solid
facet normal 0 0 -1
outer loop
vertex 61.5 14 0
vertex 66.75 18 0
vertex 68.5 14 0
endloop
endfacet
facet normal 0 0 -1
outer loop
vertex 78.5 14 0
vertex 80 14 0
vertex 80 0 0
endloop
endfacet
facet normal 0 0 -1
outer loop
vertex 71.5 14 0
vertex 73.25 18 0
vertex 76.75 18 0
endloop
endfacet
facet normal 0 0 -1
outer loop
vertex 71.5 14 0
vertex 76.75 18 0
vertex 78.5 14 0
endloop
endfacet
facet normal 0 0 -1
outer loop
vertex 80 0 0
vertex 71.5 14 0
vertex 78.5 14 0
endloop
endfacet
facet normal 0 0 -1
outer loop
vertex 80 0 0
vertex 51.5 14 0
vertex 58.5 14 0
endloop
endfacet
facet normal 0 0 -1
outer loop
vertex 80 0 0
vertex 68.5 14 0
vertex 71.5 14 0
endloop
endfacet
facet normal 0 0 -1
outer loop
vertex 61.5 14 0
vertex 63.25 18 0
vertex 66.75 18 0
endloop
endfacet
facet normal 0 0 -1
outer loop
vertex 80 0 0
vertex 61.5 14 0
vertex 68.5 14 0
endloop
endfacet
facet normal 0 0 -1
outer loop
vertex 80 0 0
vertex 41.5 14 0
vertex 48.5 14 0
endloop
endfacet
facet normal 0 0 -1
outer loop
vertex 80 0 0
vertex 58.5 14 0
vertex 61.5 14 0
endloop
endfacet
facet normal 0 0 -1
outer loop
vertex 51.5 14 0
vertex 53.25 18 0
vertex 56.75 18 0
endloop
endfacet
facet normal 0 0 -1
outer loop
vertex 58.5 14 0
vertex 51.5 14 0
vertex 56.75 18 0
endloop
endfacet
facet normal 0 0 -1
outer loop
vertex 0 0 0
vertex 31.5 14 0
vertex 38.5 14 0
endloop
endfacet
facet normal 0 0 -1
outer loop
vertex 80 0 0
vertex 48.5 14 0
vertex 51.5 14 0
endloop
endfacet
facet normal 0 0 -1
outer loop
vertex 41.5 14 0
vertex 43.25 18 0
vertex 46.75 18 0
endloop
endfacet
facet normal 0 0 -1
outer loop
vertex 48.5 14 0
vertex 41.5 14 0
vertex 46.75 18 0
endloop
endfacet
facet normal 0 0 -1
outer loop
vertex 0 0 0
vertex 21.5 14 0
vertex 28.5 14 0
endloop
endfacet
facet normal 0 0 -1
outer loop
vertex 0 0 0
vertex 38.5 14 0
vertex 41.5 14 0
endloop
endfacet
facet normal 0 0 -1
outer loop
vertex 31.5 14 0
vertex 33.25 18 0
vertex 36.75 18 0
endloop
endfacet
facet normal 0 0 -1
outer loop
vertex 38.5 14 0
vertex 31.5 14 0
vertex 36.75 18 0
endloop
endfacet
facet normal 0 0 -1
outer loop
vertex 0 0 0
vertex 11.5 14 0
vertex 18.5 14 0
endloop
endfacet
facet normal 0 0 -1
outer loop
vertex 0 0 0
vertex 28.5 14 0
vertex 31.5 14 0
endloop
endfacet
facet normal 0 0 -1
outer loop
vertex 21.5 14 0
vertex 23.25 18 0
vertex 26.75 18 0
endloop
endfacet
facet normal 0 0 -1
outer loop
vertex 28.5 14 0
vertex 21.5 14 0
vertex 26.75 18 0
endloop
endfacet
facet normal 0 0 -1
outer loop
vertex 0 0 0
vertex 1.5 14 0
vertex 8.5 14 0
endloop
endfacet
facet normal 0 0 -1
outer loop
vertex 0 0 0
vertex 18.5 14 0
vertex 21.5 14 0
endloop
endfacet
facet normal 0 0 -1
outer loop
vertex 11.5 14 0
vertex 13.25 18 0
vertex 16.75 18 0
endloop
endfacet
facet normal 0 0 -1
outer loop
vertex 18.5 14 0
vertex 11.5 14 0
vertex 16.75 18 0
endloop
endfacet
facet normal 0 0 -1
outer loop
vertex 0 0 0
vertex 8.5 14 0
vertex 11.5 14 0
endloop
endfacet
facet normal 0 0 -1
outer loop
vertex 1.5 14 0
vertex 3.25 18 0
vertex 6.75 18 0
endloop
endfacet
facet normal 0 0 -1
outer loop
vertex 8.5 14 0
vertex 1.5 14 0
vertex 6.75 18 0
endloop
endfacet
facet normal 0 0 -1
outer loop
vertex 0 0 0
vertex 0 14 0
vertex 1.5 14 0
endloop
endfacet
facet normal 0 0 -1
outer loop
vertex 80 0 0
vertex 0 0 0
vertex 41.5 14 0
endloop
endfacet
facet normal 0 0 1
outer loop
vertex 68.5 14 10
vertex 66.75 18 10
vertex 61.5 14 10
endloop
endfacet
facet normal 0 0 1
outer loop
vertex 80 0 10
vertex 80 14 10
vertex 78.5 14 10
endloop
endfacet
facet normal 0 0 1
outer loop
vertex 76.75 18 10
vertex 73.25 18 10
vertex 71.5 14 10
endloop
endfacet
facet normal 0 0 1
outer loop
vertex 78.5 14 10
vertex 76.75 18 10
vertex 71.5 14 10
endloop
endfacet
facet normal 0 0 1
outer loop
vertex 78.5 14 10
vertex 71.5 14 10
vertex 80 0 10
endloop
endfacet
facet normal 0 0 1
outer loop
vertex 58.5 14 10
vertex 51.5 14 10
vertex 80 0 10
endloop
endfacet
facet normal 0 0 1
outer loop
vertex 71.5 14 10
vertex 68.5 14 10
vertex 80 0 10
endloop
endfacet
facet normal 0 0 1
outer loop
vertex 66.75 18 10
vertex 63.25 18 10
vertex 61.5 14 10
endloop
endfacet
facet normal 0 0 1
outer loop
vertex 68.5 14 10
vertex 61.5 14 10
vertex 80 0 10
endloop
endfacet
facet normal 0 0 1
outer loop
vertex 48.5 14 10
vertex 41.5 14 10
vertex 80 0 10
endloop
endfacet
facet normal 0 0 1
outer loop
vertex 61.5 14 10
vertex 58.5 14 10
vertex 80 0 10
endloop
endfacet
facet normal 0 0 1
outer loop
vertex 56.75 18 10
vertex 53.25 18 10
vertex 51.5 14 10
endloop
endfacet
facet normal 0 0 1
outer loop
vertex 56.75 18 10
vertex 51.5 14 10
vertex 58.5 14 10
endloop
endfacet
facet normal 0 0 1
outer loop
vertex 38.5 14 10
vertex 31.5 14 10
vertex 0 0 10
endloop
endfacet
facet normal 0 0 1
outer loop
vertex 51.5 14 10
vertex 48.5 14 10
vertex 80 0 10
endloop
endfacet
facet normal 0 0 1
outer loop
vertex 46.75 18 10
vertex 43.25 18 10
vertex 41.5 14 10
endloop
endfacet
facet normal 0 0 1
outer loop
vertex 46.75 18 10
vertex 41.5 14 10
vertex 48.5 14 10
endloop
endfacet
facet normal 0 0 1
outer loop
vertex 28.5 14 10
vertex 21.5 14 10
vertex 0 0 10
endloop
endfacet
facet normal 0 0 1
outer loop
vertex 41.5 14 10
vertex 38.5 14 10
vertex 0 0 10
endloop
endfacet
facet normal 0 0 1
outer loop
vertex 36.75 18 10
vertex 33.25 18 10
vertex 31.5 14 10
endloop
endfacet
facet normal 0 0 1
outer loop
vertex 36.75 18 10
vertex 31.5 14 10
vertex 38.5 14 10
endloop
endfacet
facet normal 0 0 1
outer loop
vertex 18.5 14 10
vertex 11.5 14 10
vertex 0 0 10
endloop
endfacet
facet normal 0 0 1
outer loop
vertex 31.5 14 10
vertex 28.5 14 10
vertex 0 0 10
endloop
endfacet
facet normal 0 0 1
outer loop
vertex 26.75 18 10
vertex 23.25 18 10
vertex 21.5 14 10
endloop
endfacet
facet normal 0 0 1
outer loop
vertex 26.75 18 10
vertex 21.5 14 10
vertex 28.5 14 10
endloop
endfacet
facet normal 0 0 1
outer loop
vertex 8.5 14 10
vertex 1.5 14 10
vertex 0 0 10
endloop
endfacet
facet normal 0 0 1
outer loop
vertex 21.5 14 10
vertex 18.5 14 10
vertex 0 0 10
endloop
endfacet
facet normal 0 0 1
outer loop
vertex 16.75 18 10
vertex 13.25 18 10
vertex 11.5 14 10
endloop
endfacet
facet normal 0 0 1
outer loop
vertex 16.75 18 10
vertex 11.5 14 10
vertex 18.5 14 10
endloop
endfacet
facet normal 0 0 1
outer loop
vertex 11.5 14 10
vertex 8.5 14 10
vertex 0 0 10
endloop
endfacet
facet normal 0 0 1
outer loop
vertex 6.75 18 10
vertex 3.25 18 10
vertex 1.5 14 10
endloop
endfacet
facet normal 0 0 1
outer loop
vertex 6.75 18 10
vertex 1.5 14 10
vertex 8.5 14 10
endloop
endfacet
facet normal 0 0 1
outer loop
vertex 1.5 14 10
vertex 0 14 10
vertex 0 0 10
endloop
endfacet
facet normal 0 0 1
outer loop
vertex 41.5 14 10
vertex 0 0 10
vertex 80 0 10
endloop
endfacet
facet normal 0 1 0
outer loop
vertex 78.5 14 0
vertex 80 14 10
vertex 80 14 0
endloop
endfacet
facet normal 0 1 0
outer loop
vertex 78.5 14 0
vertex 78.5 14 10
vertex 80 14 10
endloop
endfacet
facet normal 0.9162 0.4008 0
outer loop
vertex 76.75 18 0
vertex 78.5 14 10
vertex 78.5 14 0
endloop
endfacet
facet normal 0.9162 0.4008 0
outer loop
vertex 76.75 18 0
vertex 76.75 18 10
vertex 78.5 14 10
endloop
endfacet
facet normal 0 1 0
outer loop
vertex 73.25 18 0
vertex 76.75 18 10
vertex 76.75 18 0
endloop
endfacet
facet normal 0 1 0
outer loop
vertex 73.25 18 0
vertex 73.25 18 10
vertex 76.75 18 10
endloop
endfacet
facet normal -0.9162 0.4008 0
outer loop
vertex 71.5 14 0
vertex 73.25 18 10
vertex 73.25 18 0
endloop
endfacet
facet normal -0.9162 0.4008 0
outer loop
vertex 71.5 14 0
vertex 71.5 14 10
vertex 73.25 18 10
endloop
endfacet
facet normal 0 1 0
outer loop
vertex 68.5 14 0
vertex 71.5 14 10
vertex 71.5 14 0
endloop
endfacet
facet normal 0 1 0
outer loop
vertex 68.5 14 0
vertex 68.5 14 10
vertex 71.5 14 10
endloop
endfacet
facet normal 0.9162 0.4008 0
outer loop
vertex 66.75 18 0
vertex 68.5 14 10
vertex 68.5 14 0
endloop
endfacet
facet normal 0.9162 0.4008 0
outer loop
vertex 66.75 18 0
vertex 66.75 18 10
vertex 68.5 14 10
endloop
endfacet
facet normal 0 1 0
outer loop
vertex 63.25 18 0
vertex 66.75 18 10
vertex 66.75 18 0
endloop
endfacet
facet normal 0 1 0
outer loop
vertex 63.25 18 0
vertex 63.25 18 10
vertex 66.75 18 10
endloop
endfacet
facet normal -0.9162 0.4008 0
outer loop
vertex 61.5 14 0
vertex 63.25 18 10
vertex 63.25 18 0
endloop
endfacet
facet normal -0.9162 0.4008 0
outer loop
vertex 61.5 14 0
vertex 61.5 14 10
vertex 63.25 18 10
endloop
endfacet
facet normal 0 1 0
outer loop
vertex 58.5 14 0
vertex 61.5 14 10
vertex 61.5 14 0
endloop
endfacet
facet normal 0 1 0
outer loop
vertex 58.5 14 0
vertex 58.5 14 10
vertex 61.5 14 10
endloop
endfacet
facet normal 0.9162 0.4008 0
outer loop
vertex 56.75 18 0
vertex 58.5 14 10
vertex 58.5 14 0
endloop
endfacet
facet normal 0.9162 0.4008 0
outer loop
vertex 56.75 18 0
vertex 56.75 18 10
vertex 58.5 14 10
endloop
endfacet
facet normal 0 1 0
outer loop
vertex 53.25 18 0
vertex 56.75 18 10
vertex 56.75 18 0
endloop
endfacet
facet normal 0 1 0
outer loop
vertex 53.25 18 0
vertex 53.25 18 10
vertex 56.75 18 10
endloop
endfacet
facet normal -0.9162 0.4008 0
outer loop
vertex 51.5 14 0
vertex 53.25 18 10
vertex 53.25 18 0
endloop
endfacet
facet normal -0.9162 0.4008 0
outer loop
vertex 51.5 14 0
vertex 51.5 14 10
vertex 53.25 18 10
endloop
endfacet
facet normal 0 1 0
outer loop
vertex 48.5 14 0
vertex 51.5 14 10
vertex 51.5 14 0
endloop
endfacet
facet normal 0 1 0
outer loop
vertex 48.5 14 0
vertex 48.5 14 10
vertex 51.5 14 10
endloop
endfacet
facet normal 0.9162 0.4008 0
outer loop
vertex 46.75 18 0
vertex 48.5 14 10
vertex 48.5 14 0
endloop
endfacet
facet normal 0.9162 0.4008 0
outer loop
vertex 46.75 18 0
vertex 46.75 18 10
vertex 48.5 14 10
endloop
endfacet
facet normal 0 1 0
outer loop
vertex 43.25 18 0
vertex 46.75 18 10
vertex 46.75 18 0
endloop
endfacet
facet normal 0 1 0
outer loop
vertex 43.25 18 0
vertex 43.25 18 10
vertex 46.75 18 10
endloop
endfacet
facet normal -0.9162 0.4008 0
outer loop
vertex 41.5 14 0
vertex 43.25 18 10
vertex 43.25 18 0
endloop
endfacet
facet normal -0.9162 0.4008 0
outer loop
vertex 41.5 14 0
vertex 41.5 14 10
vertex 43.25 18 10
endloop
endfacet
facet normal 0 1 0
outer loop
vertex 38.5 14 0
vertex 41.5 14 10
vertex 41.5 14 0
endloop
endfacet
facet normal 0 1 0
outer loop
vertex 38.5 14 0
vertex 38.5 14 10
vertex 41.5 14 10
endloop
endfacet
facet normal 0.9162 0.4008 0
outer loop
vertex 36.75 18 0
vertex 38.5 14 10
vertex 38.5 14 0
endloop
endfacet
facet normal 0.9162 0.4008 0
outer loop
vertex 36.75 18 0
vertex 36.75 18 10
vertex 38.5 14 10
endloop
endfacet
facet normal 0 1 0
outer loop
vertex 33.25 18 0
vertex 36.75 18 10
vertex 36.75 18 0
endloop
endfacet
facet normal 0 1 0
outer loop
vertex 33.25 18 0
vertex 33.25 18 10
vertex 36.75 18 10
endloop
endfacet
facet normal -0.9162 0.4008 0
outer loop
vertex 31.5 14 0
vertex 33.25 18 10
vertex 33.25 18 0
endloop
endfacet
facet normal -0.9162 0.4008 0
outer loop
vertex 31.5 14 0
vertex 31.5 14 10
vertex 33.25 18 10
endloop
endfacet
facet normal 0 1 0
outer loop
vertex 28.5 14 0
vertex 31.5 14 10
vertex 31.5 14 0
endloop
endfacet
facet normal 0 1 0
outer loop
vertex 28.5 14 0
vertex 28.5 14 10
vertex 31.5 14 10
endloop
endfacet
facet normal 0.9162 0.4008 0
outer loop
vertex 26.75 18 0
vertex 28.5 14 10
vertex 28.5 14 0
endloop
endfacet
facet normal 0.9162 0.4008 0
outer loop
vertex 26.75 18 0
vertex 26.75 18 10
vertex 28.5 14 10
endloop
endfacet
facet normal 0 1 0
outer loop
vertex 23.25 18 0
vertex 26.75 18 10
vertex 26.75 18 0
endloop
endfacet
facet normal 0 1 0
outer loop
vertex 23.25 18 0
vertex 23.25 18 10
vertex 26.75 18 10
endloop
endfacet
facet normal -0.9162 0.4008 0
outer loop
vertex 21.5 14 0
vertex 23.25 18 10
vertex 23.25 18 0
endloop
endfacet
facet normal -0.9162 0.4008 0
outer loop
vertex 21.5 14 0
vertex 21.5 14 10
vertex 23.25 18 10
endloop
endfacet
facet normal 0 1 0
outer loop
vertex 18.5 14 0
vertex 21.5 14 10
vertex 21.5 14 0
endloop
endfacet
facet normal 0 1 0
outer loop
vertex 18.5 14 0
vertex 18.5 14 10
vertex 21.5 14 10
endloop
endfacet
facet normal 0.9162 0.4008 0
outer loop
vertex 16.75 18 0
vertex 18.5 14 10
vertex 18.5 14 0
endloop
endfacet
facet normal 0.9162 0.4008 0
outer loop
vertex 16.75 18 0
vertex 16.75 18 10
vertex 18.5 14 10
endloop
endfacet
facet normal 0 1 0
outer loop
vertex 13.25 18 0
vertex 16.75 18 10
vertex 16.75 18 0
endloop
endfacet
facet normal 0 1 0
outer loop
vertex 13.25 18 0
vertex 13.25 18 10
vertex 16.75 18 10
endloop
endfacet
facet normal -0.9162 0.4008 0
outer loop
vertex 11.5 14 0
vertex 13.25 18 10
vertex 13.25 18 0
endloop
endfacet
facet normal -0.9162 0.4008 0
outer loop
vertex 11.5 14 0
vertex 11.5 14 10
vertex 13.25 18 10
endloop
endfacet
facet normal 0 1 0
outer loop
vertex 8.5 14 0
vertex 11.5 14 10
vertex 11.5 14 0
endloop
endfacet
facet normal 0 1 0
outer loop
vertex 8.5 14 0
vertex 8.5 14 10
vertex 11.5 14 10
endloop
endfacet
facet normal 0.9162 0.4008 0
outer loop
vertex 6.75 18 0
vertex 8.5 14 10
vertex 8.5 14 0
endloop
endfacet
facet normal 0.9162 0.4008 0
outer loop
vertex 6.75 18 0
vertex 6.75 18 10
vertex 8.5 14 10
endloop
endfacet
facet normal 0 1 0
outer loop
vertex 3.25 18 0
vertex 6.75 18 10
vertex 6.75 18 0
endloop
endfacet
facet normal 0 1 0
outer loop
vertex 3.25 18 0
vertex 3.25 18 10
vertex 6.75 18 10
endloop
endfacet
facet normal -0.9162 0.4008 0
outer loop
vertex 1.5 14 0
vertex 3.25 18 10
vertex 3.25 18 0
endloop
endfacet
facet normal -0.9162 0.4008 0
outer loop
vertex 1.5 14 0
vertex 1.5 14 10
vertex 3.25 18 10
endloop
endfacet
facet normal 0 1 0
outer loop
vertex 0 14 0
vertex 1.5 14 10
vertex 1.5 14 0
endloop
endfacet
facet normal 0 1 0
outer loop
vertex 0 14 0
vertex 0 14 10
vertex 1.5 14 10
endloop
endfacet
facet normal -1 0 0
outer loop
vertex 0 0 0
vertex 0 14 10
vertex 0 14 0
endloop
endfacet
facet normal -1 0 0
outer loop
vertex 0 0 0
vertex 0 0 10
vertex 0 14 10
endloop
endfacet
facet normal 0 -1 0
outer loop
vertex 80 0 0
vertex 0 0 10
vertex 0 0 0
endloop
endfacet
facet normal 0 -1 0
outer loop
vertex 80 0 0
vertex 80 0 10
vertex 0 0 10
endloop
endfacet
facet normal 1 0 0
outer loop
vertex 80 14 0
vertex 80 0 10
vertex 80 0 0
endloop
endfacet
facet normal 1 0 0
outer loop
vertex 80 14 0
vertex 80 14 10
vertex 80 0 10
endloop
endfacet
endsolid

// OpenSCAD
$fn = 32;

// ----------------------------------------------------------------------
// Gear rack: 8 teeth, pitch 10 mm
// ----------------------------------------------------------------------

// --- parameters (mm) ---
teeth = 8;                // number of teeth
pitch = 10;               // tooth pitch, X
root_w = 7;               // tooth width at the root
tip_w = 3.5;              // tooth width at the tip
base_h = 14;              // rack body height, Y
tooth_h = 4;              // tooth height above the body
plate_t = 10;             // rack width, Z (extrusion height)

rack_l = teeth * pitch;  // overall length
total_h = base_h + tooth_h;  // overall height

profile = [[0, 0], [80, 0], [80, 14], [78.5, 14], [76.75, 18], [73.25, 18], [71.5, 14], [68.5, 14], [66.75, 18], [63.25, 18], [61.5, 14], [58.5, 14], [56.75, 18], [53.25, 18], [51.5, 14], [48.5, 14], [46.75, 18], [43.25, 18], [41.5, 14], [38.5, 14], [36.75, 18], [33.25, 18], [31.5, 14], [28.5, 14], [26.75, 18], [23.25, 18], [21.5, 14], [18.5, 14], [16.75, 18], [13.25, 18], [11.5, 14], [8.5, 14], [6.75, 18], [3.25, 18], [1.5, 14], [0, 14]];  // primary outline, 36 points, counter clockwise

// --- the one profile operation ---
linear_extrude(height = plate_t) polygon(points = profile);
